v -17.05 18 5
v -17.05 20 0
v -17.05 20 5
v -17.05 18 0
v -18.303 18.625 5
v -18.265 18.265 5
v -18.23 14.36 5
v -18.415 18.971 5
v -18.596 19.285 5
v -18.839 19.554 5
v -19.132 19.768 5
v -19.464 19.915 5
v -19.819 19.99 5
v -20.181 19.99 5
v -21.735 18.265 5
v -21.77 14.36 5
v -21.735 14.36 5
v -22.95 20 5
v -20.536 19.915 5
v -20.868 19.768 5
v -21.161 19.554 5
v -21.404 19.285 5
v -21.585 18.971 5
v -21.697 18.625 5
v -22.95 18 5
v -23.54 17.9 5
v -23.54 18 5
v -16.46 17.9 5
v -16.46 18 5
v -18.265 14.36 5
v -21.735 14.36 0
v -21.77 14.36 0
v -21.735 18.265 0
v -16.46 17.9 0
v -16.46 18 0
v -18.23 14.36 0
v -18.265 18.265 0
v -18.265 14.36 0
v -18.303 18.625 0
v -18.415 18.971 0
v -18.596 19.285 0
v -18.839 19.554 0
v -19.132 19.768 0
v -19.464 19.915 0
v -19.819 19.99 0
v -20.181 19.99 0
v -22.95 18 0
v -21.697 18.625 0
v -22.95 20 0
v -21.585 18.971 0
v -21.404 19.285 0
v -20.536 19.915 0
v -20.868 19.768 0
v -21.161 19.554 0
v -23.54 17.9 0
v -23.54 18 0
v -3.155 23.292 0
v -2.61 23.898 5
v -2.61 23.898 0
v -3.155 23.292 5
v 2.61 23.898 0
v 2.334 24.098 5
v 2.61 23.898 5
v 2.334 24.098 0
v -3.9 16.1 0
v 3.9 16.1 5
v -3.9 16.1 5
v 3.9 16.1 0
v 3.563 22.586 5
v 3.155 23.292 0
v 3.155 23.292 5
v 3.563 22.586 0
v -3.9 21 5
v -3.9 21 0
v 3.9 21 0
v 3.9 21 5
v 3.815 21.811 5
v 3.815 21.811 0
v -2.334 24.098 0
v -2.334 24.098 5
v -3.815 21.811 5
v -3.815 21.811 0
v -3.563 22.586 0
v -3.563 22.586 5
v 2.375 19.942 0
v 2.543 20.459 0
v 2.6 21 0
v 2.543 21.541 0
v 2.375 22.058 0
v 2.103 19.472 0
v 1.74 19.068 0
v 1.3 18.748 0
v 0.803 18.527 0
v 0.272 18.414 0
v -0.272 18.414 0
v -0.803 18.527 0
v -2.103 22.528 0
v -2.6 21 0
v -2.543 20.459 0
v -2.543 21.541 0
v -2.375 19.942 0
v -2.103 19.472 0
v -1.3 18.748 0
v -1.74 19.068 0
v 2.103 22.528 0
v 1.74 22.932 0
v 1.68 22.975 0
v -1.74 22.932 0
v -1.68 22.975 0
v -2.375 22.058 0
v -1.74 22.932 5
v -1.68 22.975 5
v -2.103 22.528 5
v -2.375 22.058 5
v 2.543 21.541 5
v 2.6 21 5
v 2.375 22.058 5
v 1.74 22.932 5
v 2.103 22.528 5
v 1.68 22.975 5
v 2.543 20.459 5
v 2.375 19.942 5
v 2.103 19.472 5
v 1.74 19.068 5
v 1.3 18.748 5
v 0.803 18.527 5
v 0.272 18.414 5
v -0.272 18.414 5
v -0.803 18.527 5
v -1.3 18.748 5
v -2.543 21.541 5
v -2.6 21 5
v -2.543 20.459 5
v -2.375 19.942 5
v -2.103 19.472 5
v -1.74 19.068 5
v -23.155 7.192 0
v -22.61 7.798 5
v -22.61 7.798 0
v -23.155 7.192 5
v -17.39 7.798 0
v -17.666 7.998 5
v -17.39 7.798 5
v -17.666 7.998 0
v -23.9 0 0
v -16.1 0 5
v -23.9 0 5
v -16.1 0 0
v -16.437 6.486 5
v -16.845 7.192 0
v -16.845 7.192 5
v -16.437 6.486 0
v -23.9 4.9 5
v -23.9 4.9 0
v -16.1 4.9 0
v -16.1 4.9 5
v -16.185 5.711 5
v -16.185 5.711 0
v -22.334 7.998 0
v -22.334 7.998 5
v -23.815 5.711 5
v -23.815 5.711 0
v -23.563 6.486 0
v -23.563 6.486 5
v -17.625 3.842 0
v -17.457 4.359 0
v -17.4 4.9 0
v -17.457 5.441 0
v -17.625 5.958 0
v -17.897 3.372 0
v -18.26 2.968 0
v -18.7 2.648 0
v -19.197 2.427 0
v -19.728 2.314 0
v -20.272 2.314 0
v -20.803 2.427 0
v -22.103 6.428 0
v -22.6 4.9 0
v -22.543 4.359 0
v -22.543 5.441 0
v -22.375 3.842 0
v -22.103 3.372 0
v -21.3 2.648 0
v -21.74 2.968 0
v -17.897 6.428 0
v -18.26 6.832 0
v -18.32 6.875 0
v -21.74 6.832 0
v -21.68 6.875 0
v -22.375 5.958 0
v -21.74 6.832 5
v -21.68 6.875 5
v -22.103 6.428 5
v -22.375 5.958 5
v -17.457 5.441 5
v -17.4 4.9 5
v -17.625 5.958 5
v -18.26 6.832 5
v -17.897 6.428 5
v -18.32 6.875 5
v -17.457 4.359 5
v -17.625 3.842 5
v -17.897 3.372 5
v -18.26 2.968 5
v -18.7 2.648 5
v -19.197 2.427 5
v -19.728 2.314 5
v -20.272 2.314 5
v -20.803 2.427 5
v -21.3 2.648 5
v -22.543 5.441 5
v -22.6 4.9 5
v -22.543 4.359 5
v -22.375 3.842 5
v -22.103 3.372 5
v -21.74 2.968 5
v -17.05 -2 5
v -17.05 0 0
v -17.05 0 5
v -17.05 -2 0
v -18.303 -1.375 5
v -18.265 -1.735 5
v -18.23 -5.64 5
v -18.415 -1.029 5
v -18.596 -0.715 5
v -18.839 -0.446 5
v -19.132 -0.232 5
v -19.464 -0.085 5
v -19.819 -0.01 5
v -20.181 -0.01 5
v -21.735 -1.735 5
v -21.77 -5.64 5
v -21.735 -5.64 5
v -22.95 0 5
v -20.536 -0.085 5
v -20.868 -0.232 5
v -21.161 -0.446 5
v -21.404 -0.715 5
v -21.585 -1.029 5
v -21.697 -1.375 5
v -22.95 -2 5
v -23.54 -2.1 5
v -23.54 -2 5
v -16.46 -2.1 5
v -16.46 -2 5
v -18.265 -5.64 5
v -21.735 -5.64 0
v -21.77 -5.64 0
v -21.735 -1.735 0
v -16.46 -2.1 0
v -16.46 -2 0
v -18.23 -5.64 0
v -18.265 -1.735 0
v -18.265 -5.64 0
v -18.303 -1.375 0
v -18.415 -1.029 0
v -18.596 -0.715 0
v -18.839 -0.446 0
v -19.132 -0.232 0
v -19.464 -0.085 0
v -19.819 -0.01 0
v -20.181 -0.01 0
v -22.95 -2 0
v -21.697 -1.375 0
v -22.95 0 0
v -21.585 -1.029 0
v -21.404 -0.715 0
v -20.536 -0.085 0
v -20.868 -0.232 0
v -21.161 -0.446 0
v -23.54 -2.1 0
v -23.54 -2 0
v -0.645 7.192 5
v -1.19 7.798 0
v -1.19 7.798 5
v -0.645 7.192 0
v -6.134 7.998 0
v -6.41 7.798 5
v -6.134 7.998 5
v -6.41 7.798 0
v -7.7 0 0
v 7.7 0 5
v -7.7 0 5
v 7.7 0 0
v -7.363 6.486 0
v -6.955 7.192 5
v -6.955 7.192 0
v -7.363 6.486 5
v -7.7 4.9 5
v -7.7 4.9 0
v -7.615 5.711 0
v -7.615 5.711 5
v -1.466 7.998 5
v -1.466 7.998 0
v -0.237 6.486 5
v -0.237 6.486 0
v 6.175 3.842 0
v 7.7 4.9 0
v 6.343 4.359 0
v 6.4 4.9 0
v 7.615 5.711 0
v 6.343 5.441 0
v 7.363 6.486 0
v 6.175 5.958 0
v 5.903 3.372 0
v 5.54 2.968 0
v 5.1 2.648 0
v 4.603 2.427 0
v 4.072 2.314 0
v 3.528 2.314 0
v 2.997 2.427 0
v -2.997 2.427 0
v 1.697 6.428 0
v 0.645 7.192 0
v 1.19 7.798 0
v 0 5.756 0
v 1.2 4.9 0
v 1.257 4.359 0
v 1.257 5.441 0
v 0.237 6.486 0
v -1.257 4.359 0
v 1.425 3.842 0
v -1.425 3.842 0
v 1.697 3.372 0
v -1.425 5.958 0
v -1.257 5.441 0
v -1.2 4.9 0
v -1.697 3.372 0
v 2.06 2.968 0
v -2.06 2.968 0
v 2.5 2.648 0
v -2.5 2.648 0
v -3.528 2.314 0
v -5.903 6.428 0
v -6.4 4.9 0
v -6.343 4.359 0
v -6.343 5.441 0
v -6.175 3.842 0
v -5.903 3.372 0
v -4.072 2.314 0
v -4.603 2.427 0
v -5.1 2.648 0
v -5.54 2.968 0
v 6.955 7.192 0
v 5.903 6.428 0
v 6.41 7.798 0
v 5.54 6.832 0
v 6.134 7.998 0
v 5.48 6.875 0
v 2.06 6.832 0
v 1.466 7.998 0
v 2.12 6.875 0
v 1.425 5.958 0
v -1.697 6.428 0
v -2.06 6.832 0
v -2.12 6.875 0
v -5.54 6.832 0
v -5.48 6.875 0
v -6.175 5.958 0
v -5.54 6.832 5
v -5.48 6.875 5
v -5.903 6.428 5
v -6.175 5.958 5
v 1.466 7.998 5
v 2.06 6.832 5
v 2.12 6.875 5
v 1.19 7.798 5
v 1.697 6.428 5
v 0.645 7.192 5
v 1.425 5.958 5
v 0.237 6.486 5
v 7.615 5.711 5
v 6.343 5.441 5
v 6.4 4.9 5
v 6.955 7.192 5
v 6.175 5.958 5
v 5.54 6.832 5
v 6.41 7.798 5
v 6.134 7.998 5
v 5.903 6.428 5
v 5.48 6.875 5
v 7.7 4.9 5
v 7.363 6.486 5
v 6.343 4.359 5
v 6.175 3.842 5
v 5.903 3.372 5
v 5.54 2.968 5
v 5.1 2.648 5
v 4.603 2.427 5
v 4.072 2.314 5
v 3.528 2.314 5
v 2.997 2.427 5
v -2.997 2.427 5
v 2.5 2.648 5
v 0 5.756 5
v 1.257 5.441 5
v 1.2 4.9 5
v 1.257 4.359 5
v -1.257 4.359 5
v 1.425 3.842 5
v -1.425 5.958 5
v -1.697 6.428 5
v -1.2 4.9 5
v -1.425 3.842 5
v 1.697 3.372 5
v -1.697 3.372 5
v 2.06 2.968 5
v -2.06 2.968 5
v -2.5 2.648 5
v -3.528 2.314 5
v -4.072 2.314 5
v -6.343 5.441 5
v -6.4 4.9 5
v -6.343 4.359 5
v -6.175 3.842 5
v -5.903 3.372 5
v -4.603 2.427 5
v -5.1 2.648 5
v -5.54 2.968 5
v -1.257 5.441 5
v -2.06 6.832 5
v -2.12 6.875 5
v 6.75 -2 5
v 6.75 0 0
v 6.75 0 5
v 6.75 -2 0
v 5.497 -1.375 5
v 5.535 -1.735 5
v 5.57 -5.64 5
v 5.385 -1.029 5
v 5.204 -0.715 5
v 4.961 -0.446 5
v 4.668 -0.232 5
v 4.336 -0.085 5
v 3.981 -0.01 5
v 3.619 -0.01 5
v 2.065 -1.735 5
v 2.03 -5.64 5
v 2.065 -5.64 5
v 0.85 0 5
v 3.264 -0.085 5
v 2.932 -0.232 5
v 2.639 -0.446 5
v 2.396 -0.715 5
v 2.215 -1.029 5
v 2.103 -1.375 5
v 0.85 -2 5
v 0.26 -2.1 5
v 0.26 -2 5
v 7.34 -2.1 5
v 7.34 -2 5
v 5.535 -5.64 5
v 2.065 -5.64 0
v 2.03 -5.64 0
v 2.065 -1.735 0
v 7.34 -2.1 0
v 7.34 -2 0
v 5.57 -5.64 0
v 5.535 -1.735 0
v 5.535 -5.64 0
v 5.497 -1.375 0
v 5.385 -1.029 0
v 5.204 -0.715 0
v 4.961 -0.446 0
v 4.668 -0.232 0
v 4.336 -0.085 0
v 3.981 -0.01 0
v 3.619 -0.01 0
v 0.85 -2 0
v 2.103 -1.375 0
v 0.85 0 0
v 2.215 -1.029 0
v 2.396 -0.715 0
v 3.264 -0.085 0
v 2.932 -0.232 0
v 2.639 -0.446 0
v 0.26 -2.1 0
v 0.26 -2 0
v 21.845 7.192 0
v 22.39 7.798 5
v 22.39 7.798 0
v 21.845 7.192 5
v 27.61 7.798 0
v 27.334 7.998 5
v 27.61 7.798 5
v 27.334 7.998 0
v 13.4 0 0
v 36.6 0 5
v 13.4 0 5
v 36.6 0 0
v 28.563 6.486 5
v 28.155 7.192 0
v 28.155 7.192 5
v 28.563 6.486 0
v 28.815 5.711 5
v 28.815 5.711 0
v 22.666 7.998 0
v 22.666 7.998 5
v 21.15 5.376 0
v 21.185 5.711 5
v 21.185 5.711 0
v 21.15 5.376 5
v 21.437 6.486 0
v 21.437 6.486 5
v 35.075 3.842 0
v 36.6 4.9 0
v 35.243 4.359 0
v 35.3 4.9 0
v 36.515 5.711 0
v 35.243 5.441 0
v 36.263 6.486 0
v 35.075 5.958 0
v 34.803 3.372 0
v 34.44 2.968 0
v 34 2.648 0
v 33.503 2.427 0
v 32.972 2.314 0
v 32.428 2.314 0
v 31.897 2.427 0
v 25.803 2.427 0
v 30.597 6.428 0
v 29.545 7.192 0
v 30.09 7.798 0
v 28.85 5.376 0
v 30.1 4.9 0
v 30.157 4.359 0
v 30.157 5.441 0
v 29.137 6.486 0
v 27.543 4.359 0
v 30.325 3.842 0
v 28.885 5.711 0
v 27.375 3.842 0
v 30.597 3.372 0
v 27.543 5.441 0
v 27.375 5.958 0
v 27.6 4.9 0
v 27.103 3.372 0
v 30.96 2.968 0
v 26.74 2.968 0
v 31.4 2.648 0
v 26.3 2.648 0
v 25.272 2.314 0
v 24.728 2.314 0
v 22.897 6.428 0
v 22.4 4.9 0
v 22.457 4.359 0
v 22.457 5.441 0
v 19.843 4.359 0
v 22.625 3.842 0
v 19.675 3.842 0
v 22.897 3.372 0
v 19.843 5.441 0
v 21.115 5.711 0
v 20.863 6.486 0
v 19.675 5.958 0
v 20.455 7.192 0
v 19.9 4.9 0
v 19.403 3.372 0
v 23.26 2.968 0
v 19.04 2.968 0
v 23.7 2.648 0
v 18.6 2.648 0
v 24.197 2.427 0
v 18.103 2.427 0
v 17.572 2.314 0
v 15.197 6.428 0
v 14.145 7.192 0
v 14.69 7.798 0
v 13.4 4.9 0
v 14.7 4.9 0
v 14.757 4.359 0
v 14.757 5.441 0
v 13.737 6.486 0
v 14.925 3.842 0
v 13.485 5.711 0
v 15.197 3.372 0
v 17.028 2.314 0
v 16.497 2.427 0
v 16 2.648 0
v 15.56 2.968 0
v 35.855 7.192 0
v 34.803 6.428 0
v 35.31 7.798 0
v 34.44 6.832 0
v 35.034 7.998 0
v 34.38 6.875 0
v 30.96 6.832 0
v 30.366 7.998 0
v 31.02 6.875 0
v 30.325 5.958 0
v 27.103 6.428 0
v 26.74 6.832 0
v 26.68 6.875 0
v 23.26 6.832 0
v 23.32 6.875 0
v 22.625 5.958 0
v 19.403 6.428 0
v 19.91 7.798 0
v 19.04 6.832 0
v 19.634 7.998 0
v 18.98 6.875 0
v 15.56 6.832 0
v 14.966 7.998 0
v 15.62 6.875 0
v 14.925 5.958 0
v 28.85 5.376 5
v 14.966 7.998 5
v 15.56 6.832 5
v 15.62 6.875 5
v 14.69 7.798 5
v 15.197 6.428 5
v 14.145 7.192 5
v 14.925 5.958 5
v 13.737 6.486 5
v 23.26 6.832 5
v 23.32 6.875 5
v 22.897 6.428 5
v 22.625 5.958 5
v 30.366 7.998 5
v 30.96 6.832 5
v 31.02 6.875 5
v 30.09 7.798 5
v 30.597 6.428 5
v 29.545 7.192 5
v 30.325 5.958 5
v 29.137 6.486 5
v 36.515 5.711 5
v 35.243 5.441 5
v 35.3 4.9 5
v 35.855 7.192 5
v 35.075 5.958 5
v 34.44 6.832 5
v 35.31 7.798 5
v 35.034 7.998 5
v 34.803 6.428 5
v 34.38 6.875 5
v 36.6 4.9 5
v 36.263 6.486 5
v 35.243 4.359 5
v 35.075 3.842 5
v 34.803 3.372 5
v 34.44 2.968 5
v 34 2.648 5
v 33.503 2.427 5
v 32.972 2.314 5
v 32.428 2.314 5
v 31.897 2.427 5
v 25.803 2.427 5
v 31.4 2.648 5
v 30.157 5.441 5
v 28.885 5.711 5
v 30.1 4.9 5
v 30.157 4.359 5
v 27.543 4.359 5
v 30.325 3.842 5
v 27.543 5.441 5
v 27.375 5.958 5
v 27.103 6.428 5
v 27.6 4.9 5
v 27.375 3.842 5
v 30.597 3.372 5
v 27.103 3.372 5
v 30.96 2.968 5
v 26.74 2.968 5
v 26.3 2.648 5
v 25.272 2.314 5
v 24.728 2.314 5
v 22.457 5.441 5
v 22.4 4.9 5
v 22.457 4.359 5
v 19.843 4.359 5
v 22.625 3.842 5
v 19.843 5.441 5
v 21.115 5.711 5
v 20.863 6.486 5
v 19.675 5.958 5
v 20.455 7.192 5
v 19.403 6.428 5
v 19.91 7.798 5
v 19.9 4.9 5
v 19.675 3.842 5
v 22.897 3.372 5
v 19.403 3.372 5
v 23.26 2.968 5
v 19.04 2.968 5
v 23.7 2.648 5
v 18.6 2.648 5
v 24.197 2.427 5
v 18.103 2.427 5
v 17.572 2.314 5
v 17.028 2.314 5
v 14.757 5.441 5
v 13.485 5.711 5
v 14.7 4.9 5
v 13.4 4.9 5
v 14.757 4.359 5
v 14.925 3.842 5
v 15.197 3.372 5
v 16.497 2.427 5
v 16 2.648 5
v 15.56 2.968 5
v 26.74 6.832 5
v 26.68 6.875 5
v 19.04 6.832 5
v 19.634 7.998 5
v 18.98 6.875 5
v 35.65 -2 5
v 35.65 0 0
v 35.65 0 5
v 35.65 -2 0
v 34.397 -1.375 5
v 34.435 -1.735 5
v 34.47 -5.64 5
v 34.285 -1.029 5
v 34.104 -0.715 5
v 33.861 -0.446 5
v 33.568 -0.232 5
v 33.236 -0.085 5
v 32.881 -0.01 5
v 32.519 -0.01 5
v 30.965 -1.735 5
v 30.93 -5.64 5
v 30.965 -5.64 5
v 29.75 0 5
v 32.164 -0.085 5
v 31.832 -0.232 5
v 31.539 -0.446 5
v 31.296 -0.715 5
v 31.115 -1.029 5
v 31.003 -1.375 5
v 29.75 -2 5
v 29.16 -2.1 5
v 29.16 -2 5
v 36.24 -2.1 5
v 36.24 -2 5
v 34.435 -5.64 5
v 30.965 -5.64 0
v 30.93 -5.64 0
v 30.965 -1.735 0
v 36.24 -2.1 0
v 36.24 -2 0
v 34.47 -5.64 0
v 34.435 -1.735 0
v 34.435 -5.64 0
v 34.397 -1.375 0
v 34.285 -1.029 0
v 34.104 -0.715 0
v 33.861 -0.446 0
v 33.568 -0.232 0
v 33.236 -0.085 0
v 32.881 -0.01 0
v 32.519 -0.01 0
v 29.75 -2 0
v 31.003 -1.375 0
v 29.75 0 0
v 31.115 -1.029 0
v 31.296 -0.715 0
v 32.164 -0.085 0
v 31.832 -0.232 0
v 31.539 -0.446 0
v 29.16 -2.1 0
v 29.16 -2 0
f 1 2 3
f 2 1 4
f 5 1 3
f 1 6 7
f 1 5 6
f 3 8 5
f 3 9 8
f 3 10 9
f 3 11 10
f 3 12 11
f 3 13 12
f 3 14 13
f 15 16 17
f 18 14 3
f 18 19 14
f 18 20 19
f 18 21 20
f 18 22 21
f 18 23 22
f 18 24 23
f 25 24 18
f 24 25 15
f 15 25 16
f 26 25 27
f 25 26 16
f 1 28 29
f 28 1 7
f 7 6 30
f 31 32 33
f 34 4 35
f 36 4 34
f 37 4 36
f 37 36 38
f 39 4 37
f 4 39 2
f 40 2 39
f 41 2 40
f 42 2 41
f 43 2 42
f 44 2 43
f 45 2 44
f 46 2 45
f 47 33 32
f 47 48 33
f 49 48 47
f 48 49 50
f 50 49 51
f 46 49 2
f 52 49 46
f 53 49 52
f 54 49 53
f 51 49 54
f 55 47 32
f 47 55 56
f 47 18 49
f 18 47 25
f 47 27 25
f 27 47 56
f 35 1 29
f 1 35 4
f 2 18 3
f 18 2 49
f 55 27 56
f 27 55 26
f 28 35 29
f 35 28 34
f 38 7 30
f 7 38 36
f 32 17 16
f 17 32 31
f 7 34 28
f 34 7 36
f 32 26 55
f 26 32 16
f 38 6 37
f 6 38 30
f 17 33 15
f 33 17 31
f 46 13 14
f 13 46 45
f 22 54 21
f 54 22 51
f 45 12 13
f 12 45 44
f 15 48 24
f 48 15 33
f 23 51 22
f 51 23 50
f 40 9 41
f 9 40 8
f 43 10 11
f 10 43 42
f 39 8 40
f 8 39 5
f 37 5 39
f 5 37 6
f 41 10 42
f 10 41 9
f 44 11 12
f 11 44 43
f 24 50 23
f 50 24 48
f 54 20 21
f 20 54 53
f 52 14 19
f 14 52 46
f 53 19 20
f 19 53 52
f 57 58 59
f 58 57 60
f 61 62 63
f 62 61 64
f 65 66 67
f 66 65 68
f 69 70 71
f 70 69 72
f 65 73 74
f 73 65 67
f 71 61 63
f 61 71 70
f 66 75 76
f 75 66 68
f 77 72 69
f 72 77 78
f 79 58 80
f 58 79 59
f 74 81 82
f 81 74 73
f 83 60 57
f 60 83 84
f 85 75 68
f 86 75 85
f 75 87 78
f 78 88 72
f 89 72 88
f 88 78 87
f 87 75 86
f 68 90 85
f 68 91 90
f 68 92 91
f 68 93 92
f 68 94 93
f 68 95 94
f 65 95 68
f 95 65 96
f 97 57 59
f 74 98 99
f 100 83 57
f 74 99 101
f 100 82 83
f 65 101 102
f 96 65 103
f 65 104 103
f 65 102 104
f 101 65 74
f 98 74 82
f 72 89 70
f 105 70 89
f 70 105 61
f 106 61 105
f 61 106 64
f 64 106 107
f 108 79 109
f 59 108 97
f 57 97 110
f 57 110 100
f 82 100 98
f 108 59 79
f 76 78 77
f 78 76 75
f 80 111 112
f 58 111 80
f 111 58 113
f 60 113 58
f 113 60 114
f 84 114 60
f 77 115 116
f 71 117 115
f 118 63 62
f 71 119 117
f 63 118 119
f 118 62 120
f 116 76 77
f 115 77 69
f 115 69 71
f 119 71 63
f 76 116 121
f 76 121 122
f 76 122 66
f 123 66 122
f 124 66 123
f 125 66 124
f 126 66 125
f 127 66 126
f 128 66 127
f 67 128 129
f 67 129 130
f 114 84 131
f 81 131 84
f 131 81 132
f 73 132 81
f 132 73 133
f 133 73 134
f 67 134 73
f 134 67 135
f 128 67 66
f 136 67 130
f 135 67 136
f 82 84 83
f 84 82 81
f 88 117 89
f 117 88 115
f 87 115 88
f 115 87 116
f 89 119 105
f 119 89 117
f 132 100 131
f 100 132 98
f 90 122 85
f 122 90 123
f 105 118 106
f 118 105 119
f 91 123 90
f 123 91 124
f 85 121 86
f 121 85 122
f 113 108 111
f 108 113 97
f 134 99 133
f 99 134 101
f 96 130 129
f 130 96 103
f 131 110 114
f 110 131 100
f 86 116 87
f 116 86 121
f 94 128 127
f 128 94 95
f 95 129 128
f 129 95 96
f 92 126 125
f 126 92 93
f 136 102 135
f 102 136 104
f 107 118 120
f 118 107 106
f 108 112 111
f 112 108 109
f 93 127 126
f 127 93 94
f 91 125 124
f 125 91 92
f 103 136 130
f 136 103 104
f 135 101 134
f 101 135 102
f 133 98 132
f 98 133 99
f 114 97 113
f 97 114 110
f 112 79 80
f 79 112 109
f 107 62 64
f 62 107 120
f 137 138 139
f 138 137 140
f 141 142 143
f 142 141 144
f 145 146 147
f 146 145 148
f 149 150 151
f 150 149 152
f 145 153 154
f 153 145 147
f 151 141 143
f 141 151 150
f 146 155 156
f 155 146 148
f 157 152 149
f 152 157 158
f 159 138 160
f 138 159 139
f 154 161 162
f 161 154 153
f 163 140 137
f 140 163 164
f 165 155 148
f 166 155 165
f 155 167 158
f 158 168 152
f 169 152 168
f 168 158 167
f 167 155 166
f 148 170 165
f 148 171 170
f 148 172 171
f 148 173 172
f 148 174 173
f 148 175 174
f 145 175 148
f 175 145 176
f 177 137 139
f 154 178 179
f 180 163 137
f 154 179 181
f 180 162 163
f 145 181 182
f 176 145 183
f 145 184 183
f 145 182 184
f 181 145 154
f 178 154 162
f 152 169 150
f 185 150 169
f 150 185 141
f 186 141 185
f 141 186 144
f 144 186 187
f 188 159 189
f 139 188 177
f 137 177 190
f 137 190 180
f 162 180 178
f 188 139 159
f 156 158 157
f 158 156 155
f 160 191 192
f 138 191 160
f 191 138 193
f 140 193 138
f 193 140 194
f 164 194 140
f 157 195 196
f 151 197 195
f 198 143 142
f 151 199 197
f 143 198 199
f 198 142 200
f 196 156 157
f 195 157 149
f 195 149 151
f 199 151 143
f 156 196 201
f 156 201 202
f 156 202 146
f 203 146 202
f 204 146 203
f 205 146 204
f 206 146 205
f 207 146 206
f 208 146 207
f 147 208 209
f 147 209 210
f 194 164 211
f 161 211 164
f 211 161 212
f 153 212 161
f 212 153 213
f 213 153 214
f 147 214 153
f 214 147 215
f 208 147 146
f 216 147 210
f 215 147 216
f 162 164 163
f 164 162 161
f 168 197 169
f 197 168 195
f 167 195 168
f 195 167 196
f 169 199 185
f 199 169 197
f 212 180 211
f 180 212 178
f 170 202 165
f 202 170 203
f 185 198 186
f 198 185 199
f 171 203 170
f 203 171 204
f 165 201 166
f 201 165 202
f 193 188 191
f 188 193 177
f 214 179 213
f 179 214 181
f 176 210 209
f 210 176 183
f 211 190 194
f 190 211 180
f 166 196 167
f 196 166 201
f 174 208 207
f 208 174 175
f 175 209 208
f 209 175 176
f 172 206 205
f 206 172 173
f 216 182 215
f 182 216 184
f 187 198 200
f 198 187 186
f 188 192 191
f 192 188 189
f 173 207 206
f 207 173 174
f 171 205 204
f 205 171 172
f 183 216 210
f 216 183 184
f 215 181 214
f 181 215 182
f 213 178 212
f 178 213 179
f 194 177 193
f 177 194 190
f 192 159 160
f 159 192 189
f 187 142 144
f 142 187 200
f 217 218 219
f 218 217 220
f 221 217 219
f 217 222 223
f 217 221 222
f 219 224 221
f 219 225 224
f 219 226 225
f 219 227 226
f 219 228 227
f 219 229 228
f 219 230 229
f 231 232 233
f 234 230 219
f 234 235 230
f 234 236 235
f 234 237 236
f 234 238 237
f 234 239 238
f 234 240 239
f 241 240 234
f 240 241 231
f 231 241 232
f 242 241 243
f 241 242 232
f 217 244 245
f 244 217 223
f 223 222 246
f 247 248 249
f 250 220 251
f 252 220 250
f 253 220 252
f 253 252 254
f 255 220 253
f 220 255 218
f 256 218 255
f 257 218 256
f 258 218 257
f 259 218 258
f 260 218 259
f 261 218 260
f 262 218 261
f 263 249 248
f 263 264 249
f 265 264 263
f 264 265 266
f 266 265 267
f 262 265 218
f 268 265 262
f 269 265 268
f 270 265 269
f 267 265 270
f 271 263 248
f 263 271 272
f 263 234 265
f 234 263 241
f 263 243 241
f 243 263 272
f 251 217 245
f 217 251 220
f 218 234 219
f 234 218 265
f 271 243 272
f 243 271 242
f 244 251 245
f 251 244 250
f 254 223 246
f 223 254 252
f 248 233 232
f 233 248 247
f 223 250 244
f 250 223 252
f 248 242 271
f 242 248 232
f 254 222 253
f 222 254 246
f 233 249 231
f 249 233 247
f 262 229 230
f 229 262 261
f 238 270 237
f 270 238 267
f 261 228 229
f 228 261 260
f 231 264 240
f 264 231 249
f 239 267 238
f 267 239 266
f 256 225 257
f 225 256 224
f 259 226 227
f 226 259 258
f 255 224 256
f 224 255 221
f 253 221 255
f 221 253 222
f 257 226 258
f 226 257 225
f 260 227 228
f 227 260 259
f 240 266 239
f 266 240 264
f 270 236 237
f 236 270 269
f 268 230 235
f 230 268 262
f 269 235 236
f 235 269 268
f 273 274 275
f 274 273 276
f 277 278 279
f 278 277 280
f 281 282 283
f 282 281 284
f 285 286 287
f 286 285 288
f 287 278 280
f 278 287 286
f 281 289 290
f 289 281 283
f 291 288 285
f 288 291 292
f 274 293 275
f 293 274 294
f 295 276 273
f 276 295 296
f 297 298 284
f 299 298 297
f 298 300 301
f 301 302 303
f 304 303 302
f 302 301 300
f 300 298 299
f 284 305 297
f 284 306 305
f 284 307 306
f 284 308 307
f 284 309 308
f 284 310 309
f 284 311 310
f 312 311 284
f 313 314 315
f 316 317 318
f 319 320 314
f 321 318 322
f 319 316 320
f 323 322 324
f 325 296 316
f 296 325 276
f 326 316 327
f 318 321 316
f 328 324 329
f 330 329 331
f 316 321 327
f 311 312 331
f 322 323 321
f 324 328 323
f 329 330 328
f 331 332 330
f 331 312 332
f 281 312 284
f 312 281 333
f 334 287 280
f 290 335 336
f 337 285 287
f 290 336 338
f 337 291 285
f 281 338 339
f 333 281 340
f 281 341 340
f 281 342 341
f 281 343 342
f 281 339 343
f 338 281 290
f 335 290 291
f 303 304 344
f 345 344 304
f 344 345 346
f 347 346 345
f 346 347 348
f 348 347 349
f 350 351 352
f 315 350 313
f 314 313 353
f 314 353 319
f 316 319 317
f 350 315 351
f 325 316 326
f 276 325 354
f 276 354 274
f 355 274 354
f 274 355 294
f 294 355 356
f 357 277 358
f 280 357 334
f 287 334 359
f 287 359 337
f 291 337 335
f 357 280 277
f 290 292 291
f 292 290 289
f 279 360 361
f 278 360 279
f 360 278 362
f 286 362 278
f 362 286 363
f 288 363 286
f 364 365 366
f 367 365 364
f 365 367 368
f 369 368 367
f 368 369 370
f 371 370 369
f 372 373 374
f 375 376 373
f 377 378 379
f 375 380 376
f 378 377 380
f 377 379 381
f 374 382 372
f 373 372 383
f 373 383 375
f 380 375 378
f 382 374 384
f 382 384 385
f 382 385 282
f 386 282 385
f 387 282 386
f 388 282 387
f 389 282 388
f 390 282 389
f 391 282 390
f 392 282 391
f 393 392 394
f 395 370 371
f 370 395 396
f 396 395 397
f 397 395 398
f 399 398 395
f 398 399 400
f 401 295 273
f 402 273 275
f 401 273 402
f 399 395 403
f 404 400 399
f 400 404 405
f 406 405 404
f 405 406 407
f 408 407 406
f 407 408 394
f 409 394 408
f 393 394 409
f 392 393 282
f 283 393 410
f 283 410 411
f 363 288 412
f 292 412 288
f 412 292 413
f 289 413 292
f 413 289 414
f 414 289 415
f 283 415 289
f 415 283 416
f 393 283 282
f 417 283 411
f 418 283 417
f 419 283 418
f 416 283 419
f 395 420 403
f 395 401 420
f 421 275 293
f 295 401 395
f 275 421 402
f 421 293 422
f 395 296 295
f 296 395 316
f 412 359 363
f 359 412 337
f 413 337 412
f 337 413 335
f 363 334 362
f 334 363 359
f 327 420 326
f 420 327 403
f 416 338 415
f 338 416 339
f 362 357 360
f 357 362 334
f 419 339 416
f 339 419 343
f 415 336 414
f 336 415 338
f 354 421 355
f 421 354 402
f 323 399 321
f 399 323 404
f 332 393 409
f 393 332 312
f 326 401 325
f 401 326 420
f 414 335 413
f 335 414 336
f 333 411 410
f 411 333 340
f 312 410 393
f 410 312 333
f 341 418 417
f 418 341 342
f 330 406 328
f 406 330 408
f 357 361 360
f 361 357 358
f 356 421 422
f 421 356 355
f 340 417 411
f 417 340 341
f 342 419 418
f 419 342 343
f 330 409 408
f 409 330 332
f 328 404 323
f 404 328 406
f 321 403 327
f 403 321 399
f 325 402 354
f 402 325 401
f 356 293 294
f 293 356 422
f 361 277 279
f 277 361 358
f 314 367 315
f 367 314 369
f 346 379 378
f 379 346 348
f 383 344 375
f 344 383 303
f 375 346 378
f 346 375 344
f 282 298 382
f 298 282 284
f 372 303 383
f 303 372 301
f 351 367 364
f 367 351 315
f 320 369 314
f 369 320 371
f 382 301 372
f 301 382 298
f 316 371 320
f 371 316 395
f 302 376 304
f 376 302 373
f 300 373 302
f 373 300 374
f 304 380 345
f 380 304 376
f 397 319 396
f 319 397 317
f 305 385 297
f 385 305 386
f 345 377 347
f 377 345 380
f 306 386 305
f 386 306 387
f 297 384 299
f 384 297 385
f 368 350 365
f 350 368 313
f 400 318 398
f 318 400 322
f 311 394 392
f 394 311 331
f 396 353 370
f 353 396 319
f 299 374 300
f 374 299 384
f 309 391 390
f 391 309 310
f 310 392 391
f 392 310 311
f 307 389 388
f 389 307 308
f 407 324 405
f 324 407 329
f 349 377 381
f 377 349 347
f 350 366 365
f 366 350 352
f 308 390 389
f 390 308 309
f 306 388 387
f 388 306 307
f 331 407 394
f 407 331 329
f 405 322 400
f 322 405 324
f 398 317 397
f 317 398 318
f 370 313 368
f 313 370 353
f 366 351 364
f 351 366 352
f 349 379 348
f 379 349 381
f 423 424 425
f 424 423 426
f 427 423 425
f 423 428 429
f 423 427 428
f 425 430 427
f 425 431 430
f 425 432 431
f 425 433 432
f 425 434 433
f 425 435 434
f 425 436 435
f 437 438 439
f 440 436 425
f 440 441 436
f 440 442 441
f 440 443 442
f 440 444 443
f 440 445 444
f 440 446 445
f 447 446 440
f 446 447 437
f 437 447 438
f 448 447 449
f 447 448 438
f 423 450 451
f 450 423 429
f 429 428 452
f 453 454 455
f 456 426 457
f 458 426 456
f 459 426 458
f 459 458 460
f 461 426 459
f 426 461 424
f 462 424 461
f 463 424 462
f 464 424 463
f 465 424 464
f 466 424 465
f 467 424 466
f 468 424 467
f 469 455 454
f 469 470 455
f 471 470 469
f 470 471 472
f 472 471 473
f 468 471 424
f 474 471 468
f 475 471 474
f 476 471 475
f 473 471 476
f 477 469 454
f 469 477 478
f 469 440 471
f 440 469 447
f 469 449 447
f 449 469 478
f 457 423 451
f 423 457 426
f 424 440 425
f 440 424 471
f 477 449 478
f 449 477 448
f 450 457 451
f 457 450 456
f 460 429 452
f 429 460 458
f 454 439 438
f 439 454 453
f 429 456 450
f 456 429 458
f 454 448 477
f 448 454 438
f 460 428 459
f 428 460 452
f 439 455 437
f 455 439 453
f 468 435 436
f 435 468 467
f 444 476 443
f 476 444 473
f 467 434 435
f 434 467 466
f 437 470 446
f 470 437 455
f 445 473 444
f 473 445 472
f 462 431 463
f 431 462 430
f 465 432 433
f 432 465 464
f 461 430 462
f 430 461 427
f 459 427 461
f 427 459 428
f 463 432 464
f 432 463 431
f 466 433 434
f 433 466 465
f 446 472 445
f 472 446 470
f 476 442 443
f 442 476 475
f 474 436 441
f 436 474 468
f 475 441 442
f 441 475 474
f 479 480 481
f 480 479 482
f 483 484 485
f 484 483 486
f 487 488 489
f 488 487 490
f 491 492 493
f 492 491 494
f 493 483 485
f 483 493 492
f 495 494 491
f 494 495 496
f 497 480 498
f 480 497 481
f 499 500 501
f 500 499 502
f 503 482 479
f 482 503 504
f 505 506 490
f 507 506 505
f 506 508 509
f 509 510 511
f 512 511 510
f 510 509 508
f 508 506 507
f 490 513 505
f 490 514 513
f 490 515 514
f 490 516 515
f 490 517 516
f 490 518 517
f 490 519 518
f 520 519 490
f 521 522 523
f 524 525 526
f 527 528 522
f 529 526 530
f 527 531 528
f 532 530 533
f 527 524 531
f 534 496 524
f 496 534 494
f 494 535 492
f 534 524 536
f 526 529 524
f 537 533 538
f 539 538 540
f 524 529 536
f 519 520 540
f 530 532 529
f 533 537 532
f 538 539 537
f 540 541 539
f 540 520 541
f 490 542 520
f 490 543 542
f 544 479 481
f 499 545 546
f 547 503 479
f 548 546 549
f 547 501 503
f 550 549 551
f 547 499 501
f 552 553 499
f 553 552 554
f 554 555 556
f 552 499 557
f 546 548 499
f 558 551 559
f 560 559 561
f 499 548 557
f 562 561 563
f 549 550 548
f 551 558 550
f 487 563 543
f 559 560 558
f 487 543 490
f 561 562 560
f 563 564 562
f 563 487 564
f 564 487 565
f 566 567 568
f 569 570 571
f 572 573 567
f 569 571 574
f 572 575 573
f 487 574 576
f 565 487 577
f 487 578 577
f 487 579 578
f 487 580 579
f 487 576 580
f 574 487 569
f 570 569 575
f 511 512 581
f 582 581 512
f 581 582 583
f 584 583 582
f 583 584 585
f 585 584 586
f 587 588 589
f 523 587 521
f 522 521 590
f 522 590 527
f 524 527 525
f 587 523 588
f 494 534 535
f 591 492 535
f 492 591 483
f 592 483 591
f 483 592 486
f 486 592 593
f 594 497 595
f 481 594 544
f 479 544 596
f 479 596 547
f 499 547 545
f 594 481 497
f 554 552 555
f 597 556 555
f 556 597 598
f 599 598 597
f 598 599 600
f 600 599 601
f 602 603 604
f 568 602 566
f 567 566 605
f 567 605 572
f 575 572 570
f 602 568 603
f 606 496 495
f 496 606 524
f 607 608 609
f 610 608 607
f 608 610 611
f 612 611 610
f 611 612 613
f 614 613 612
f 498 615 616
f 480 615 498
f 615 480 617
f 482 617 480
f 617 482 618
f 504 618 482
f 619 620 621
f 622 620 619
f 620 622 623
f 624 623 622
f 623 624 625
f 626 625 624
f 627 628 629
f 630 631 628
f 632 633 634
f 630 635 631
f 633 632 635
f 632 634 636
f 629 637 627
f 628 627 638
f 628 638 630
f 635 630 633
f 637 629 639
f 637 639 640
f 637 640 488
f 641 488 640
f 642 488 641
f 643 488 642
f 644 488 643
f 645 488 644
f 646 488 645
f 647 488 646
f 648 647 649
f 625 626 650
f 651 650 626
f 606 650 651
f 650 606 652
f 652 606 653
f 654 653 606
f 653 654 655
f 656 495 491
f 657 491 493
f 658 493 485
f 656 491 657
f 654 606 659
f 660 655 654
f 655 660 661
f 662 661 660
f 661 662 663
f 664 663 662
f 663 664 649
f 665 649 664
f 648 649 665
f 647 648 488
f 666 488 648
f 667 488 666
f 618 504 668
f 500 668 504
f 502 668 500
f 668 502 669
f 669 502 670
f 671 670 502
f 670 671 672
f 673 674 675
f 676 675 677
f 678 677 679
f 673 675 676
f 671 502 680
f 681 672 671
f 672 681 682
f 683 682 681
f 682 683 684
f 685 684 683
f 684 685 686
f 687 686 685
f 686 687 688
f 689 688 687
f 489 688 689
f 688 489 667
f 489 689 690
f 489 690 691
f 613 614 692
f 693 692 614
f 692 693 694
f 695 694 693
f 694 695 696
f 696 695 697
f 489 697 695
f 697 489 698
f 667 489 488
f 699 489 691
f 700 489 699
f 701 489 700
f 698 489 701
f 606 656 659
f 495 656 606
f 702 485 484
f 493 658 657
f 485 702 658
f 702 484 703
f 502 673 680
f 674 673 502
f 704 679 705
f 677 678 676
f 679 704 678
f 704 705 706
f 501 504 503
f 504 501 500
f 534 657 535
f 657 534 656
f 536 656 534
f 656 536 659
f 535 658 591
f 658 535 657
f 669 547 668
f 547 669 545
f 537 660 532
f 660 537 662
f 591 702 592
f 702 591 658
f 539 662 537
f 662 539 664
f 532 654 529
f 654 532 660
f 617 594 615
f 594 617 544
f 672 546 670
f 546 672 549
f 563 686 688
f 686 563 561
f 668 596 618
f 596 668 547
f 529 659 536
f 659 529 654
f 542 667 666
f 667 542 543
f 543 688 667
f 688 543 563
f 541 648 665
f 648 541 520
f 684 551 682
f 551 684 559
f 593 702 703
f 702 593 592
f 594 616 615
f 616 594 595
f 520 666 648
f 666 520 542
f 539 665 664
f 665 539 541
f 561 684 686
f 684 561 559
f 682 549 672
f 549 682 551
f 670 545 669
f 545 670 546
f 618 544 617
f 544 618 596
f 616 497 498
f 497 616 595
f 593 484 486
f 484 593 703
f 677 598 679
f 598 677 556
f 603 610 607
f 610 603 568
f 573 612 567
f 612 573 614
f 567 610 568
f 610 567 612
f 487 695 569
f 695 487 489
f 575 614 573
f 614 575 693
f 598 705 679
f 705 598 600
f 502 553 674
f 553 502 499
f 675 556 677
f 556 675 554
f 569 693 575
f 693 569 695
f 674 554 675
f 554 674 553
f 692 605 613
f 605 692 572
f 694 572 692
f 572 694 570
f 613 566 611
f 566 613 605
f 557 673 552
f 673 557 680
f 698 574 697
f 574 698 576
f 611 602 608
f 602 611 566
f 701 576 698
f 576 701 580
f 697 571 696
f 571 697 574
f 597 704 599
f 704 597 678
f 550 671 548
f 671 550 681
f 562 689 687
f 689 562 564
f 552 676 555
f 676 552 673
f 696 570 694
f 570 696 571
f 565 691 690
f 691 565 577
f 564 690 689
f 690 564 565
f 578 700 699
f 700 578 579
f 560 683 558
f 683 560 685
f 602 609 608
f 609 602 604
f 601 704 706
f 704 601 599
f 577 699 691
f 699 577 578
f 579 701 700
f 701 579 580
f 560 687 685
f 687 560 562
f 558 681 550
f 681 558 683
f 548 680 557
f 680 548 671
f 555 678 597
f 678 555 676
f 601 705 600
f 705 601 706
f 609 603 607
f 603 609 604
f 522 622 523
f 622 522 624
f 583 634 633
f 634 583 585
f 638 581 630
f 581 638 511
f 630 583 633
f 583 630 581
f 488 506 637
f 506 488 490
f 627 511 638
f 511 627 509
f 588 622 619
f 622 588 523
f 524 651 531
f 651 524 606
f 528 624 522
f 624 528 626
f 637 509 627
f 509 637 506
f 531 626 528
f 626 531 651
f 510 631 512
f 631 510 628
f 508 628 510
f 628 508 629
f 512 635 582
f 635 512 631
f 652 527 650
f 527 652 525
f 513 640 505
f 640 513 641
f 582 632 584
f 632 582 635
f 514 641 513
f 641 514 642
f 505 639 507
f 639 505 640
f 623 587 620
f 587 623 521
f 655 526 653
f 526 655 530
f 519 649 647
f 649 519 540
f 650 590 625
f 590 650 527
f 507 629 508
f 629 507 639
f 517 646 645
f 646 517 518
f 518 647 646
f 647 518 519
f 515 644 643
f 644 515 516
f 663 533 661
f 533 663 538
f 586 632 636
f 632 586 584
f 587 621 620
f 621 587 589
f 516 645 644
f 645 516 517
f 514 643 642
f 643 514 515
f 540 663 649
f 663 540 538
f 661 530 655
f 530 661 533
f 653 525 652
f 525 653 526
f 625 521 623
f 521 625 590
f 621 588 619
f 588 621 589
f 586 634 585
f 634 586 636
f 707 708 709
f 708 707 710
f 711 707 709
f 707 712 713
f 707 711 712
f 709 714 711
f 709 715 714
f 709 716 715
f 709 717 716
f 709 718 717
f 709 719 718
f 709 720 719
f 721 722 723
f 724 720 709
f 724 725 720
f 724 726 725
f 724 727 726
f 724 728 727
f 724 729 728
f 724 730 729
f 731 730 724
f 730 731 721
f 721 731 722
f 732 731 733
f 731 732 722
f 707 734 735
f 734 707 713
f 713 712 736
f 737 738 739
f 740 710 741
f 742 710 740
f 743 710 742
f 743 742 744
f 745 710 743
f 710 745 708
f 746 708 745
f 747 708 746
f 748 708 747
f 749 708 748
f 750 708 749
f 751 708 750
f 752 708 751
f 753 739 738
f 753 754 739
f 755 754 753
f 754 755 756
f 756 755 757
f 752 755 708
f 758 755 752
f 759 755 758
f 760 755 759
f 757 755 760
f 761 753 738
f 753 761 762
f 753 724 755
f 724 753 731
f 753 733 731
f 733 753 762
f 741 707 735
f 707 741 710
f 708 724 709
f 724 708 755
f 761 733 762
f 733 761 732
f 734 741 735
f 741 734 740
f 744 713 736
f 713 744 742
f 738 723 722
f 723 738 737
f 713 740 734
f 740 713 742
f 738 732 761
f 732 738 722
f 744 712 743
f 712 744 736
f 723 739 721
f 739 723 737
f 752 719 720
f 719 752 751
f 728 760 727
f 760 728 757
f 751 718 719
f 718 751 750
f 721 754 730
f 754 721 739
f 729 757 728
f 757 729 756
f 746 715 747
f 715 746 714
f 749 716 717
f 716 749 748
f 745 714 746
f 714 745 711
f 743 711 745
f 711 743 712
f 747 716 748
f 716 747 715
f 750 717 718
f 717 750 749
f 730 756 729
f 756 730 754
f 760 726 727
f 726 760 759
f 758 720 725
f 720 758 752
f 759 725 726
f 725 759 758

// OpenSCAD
//Buffer-Local Properties for jEdit, www.jedit.org
//:indentSize=4:tabSize=4:collapseFolds=true:folding=explicit:mode=c:

//
// (c) Andreas Thorn (andreas.thorn@gmail.com)
//	Thingiverse: 
//	
// Licence: Attribution - Share Alike - Creative Commons
//


//{{{ Info, Changelog
/*************************************************************************************************
Parametric cable clip/holder for mounting cables to aluminum extrusion.
Parametry tested for use with CAT5 network cable and 6mm slot aluminum extrusion like Makerslide.
Also tested to work well with plastic cable collectors/spirals with dimensions similar to CAT5.
Parametry should allow for other dimensions too.

Changelog;
050	Initial work. Cable holder and base. No mount. Single and dual assemblies.
051	WIP (Work in progress). More static options are now calculated from more vital options.
052	WIP. Profile mount with slot. Angle of wall opening optional.
053	WIP. Tripple assembly added.
054	WIP. Rounded slot between the hooks to prevent breakage. Translations for demo.
055	WIP. Console echos some interesting dimensions. cableholder_wallopening expands.
056	WIP. Degenerate triangle in KISSlicer. Changing back to non expanding cableholder_wallopening.
	Doesn't help. Removed the wallopening completely. Doesn't help. ?!!!
057	WIP. Error generating code restored but fixed. Use Flush Caches to get rid of persistent errors in OpenSCAD! Degenerate triangle error.
058 WIP. Stopped using polyhole since its' flat edges introduced a degenerate triangle.
059	WIP. Removed extra 0.5 distance for the rounded side of mountslot_hook to make the mount flex some.
	Added similar distance by increasing cableholder_baseheight from 0.2 to 1.0.
	Testprinted. Very tight fit in Makerslide. At 10mm height they have to be removed with pliers.
060	More hook related constants/variables parametric relations to others.
	Testprinted with KISSlicer. Cleaned up. Ready for public release.
**************************************************************************************************/
//}}}
//{{{ Variables and constants
shim = 0.1;								// used overlap meshes/cutouts

cableholder_idiam = 5.2;						// cable diameter
cableholder_height = 5;							// height of cable holder
cableholder_segments = 30;						// segments/resolution $fn of the cylindrical parts
cableholder_baseheight = 1.0;					// height of the square base of the cable holder
mountslot_width = 5.9;							// aluminium profile slot width
mountslot_thickness = 2;						// aluminium profile slot edge thickness
mountslot_height = cableholder_height;			// height of profile mount. <= cableholder_height is supported
mountslot_hookwidthmax = 1.2*mountslot_width;		// max width of locking hooks on profile mount
mountslot_hookwidthmin = 0.6*mountslot_width;		// min width of locking hooks on profile mount
mountslot_hooklength = 0.5*mountslot_hookwidthmax;	// 4	// length of locking hooks on profile mount
mountslot_hookslotwidth = mountslot_width/1.7;		// 3	// width of slot between locking hooks on profile mount

cableholder_wall = cableholder_idiam / 4;			// wall thickness
cableholder_wallopeningwidthmin = 1;				// opening in wall for cable insertion/removal
cableholder_wallopeningwidthmax = 1.1*cableholder_idiam;	// opening in wall for cable insertion/removal
cableholder_wallopeningangle = 90;				// angle of rotation of opening in wall. recommend 0 or 90.
cableholder_odiam = cableholder_idiam + (2*cableholder_wall);
//}}}

//{{{ Module polyhole
// http://hydraraptor.blogspot.se/2011/02/polyholes.html
module polyhole(h, d) {
    n = max(round(2 * d),3);
    rotate([0,0,180])
        cylinder(h = h, r = (d / 2) / cos (180 / n), $fn = n);
}
//}}}
//{{{ Module cylinda
module cylinda(diam=1,height=1,fn=60,polyhole=0)
{
	if (polyhole==1)
	{
		polyhole(h=height,d=diam);
	} else {
		cylinder(r=diam/2,h=height,$fn=fn);
	}
}
//}}}

//{{{ Module part_cableholder
module part_cableholder()
{
	difference()
	{
		union()
		{
			hull()
			{
				// cable holder
				translate([0,cableholder_baseheight,0])
				translate([0,0,0]) cylinda(cableholder_odiam,cableholder_height,cableholder_segments,0);
				// cable holder base
				translate([-cableholder_odiam/2,-cableholder_odiam/2,0]) cube([cableholder_odiam,cableholder_baseheight,cableholder_height]);
			}
		}
		// cable holder hole
		translate([0,cableholder_baseheight,0])
		translate([0,0,-shim]) cylinda(cableholder_idiam,cableholder_height+(2*shim),cableholder_segments,0);
		// opening in wall
		translate([0,cableholder_baseheight,0])
		hull()
		{
			rotate([0,0,cableholder_wallopeningangle]) translate([-0.1/2,-cableholder_wallopeningwidthmin/2,-shim]) cube([0.1,cableholder_wallopeningwidthmin,cableholder_height+(2*shim)]);
			rotate([0,0,cableholder_wallopeningangle]) translate([cableholder_odiam/2+shim,-cableholder_wallopeningwidthmax/2,-shim]) cube([0.1,cableholder_wallopeningwidthmax,cableholder_height+(2*shim)]);
		}
	}
}
//}}}
//{{{ Module part_profilemount
module part_profilemount()
{
	translate([0,0,(cableholder_height-mountslot_height)/2])
	difference()
	{
		union()
		{
			translate([-mountslot_width/2,0,0]) cube([mountslot_width,mountslot_thickness,mountslot_height]);
			hull()
			{
				translate([-mountslot_hookwidthmax/2,mountslot_thickness,0]) cube([mountslot_hookwidthmax,0.1,mountslot_height]);
				translate([-mountslot_hookwidthmin/2,mountslot_thickness+mountslot_hooklength,0]) cube([mountslot_hookwidthmin,0.1,mountslot_height]);
			}
		}
		translate([-mountslot_hookslotwidth/2,(mountslot_hookslotwidth/2)+0,-shim]) cube([mountslot_hookslotwidth,mountslot_thickness+0.1+0.1+mountslot_hooklength+shim,mountslot_height+(2*shim)]);
		translate([0,(mountslot_hookslotwidth/2)+0,-shim]) cylinda(mountslot_hookslotwidth,cableholder_height+(2*shim),cableholder_segments,0);
	}
}
//}}}


//-----------------------------------------------------------------------------
//{{{ Assemblies
// only the mount. for debugging purposes
translate([-20,20,0]) mirror([0,1,0]) color([0.5,1.0,0.5,1.0]) part_profilemount();

// only the cable holder. for debugging purposes
translate([0,20,0]) mirror([0,0,0]) color([0.5,1.0,0.5,1.0]) part_cableholder();

// cable holder single assembly
translate([-20,0,0])
{
	translate([0,cableholder_odiam/2,0]) mirror([0,0,0]) part_cableholder();
	translate([0,0,0]) mirror([0,1,0]) part_profilemount();
}

// cable holder dual assembly
translate([0,0,0])
{
	translate([-(cableholder_odiam/2)+shim,cableholder_odiam/2,0]) mirror([1,0,0]) part_cableholder();
	translate([(cableholder_odiam/2)-shim,cableholder_odiam/2,0]) mirror([0,0,0]) part_cableholder();
	translate([1*(cableholder_odiam/2)-shim,0,0]) mirror([0,1,0]) part_profilemount();
}
// cable holder tripple assembly. here with non-centered mount suitable for makeslide.
translate([25,0,0])
{
	translate([-2*(cableholder_odiam/2)+shim,cableholder_odiam/2,0]) mirror([1,0,0]) part_cableholder();
	translate([0,cableholder_odiam/2,0]) mirror([0,0,0]) part_cableholder();
	translate([2*(cableholder_odiam/2)-shim,cableholder_odiam/2,0]) mirror([0,0,0]) part_cableholder();
	translate([2*(cableholder_odiam/2)-shim,0,0]) mirror([0,1,0]) part_profilemount();
}
//}}}

// some information
echo(str("cableholder_wall = ", cableholder_wall));
echo(str("total length = ", mountslot_thickness+mountslot_hooklength+cableholder_odiam));
